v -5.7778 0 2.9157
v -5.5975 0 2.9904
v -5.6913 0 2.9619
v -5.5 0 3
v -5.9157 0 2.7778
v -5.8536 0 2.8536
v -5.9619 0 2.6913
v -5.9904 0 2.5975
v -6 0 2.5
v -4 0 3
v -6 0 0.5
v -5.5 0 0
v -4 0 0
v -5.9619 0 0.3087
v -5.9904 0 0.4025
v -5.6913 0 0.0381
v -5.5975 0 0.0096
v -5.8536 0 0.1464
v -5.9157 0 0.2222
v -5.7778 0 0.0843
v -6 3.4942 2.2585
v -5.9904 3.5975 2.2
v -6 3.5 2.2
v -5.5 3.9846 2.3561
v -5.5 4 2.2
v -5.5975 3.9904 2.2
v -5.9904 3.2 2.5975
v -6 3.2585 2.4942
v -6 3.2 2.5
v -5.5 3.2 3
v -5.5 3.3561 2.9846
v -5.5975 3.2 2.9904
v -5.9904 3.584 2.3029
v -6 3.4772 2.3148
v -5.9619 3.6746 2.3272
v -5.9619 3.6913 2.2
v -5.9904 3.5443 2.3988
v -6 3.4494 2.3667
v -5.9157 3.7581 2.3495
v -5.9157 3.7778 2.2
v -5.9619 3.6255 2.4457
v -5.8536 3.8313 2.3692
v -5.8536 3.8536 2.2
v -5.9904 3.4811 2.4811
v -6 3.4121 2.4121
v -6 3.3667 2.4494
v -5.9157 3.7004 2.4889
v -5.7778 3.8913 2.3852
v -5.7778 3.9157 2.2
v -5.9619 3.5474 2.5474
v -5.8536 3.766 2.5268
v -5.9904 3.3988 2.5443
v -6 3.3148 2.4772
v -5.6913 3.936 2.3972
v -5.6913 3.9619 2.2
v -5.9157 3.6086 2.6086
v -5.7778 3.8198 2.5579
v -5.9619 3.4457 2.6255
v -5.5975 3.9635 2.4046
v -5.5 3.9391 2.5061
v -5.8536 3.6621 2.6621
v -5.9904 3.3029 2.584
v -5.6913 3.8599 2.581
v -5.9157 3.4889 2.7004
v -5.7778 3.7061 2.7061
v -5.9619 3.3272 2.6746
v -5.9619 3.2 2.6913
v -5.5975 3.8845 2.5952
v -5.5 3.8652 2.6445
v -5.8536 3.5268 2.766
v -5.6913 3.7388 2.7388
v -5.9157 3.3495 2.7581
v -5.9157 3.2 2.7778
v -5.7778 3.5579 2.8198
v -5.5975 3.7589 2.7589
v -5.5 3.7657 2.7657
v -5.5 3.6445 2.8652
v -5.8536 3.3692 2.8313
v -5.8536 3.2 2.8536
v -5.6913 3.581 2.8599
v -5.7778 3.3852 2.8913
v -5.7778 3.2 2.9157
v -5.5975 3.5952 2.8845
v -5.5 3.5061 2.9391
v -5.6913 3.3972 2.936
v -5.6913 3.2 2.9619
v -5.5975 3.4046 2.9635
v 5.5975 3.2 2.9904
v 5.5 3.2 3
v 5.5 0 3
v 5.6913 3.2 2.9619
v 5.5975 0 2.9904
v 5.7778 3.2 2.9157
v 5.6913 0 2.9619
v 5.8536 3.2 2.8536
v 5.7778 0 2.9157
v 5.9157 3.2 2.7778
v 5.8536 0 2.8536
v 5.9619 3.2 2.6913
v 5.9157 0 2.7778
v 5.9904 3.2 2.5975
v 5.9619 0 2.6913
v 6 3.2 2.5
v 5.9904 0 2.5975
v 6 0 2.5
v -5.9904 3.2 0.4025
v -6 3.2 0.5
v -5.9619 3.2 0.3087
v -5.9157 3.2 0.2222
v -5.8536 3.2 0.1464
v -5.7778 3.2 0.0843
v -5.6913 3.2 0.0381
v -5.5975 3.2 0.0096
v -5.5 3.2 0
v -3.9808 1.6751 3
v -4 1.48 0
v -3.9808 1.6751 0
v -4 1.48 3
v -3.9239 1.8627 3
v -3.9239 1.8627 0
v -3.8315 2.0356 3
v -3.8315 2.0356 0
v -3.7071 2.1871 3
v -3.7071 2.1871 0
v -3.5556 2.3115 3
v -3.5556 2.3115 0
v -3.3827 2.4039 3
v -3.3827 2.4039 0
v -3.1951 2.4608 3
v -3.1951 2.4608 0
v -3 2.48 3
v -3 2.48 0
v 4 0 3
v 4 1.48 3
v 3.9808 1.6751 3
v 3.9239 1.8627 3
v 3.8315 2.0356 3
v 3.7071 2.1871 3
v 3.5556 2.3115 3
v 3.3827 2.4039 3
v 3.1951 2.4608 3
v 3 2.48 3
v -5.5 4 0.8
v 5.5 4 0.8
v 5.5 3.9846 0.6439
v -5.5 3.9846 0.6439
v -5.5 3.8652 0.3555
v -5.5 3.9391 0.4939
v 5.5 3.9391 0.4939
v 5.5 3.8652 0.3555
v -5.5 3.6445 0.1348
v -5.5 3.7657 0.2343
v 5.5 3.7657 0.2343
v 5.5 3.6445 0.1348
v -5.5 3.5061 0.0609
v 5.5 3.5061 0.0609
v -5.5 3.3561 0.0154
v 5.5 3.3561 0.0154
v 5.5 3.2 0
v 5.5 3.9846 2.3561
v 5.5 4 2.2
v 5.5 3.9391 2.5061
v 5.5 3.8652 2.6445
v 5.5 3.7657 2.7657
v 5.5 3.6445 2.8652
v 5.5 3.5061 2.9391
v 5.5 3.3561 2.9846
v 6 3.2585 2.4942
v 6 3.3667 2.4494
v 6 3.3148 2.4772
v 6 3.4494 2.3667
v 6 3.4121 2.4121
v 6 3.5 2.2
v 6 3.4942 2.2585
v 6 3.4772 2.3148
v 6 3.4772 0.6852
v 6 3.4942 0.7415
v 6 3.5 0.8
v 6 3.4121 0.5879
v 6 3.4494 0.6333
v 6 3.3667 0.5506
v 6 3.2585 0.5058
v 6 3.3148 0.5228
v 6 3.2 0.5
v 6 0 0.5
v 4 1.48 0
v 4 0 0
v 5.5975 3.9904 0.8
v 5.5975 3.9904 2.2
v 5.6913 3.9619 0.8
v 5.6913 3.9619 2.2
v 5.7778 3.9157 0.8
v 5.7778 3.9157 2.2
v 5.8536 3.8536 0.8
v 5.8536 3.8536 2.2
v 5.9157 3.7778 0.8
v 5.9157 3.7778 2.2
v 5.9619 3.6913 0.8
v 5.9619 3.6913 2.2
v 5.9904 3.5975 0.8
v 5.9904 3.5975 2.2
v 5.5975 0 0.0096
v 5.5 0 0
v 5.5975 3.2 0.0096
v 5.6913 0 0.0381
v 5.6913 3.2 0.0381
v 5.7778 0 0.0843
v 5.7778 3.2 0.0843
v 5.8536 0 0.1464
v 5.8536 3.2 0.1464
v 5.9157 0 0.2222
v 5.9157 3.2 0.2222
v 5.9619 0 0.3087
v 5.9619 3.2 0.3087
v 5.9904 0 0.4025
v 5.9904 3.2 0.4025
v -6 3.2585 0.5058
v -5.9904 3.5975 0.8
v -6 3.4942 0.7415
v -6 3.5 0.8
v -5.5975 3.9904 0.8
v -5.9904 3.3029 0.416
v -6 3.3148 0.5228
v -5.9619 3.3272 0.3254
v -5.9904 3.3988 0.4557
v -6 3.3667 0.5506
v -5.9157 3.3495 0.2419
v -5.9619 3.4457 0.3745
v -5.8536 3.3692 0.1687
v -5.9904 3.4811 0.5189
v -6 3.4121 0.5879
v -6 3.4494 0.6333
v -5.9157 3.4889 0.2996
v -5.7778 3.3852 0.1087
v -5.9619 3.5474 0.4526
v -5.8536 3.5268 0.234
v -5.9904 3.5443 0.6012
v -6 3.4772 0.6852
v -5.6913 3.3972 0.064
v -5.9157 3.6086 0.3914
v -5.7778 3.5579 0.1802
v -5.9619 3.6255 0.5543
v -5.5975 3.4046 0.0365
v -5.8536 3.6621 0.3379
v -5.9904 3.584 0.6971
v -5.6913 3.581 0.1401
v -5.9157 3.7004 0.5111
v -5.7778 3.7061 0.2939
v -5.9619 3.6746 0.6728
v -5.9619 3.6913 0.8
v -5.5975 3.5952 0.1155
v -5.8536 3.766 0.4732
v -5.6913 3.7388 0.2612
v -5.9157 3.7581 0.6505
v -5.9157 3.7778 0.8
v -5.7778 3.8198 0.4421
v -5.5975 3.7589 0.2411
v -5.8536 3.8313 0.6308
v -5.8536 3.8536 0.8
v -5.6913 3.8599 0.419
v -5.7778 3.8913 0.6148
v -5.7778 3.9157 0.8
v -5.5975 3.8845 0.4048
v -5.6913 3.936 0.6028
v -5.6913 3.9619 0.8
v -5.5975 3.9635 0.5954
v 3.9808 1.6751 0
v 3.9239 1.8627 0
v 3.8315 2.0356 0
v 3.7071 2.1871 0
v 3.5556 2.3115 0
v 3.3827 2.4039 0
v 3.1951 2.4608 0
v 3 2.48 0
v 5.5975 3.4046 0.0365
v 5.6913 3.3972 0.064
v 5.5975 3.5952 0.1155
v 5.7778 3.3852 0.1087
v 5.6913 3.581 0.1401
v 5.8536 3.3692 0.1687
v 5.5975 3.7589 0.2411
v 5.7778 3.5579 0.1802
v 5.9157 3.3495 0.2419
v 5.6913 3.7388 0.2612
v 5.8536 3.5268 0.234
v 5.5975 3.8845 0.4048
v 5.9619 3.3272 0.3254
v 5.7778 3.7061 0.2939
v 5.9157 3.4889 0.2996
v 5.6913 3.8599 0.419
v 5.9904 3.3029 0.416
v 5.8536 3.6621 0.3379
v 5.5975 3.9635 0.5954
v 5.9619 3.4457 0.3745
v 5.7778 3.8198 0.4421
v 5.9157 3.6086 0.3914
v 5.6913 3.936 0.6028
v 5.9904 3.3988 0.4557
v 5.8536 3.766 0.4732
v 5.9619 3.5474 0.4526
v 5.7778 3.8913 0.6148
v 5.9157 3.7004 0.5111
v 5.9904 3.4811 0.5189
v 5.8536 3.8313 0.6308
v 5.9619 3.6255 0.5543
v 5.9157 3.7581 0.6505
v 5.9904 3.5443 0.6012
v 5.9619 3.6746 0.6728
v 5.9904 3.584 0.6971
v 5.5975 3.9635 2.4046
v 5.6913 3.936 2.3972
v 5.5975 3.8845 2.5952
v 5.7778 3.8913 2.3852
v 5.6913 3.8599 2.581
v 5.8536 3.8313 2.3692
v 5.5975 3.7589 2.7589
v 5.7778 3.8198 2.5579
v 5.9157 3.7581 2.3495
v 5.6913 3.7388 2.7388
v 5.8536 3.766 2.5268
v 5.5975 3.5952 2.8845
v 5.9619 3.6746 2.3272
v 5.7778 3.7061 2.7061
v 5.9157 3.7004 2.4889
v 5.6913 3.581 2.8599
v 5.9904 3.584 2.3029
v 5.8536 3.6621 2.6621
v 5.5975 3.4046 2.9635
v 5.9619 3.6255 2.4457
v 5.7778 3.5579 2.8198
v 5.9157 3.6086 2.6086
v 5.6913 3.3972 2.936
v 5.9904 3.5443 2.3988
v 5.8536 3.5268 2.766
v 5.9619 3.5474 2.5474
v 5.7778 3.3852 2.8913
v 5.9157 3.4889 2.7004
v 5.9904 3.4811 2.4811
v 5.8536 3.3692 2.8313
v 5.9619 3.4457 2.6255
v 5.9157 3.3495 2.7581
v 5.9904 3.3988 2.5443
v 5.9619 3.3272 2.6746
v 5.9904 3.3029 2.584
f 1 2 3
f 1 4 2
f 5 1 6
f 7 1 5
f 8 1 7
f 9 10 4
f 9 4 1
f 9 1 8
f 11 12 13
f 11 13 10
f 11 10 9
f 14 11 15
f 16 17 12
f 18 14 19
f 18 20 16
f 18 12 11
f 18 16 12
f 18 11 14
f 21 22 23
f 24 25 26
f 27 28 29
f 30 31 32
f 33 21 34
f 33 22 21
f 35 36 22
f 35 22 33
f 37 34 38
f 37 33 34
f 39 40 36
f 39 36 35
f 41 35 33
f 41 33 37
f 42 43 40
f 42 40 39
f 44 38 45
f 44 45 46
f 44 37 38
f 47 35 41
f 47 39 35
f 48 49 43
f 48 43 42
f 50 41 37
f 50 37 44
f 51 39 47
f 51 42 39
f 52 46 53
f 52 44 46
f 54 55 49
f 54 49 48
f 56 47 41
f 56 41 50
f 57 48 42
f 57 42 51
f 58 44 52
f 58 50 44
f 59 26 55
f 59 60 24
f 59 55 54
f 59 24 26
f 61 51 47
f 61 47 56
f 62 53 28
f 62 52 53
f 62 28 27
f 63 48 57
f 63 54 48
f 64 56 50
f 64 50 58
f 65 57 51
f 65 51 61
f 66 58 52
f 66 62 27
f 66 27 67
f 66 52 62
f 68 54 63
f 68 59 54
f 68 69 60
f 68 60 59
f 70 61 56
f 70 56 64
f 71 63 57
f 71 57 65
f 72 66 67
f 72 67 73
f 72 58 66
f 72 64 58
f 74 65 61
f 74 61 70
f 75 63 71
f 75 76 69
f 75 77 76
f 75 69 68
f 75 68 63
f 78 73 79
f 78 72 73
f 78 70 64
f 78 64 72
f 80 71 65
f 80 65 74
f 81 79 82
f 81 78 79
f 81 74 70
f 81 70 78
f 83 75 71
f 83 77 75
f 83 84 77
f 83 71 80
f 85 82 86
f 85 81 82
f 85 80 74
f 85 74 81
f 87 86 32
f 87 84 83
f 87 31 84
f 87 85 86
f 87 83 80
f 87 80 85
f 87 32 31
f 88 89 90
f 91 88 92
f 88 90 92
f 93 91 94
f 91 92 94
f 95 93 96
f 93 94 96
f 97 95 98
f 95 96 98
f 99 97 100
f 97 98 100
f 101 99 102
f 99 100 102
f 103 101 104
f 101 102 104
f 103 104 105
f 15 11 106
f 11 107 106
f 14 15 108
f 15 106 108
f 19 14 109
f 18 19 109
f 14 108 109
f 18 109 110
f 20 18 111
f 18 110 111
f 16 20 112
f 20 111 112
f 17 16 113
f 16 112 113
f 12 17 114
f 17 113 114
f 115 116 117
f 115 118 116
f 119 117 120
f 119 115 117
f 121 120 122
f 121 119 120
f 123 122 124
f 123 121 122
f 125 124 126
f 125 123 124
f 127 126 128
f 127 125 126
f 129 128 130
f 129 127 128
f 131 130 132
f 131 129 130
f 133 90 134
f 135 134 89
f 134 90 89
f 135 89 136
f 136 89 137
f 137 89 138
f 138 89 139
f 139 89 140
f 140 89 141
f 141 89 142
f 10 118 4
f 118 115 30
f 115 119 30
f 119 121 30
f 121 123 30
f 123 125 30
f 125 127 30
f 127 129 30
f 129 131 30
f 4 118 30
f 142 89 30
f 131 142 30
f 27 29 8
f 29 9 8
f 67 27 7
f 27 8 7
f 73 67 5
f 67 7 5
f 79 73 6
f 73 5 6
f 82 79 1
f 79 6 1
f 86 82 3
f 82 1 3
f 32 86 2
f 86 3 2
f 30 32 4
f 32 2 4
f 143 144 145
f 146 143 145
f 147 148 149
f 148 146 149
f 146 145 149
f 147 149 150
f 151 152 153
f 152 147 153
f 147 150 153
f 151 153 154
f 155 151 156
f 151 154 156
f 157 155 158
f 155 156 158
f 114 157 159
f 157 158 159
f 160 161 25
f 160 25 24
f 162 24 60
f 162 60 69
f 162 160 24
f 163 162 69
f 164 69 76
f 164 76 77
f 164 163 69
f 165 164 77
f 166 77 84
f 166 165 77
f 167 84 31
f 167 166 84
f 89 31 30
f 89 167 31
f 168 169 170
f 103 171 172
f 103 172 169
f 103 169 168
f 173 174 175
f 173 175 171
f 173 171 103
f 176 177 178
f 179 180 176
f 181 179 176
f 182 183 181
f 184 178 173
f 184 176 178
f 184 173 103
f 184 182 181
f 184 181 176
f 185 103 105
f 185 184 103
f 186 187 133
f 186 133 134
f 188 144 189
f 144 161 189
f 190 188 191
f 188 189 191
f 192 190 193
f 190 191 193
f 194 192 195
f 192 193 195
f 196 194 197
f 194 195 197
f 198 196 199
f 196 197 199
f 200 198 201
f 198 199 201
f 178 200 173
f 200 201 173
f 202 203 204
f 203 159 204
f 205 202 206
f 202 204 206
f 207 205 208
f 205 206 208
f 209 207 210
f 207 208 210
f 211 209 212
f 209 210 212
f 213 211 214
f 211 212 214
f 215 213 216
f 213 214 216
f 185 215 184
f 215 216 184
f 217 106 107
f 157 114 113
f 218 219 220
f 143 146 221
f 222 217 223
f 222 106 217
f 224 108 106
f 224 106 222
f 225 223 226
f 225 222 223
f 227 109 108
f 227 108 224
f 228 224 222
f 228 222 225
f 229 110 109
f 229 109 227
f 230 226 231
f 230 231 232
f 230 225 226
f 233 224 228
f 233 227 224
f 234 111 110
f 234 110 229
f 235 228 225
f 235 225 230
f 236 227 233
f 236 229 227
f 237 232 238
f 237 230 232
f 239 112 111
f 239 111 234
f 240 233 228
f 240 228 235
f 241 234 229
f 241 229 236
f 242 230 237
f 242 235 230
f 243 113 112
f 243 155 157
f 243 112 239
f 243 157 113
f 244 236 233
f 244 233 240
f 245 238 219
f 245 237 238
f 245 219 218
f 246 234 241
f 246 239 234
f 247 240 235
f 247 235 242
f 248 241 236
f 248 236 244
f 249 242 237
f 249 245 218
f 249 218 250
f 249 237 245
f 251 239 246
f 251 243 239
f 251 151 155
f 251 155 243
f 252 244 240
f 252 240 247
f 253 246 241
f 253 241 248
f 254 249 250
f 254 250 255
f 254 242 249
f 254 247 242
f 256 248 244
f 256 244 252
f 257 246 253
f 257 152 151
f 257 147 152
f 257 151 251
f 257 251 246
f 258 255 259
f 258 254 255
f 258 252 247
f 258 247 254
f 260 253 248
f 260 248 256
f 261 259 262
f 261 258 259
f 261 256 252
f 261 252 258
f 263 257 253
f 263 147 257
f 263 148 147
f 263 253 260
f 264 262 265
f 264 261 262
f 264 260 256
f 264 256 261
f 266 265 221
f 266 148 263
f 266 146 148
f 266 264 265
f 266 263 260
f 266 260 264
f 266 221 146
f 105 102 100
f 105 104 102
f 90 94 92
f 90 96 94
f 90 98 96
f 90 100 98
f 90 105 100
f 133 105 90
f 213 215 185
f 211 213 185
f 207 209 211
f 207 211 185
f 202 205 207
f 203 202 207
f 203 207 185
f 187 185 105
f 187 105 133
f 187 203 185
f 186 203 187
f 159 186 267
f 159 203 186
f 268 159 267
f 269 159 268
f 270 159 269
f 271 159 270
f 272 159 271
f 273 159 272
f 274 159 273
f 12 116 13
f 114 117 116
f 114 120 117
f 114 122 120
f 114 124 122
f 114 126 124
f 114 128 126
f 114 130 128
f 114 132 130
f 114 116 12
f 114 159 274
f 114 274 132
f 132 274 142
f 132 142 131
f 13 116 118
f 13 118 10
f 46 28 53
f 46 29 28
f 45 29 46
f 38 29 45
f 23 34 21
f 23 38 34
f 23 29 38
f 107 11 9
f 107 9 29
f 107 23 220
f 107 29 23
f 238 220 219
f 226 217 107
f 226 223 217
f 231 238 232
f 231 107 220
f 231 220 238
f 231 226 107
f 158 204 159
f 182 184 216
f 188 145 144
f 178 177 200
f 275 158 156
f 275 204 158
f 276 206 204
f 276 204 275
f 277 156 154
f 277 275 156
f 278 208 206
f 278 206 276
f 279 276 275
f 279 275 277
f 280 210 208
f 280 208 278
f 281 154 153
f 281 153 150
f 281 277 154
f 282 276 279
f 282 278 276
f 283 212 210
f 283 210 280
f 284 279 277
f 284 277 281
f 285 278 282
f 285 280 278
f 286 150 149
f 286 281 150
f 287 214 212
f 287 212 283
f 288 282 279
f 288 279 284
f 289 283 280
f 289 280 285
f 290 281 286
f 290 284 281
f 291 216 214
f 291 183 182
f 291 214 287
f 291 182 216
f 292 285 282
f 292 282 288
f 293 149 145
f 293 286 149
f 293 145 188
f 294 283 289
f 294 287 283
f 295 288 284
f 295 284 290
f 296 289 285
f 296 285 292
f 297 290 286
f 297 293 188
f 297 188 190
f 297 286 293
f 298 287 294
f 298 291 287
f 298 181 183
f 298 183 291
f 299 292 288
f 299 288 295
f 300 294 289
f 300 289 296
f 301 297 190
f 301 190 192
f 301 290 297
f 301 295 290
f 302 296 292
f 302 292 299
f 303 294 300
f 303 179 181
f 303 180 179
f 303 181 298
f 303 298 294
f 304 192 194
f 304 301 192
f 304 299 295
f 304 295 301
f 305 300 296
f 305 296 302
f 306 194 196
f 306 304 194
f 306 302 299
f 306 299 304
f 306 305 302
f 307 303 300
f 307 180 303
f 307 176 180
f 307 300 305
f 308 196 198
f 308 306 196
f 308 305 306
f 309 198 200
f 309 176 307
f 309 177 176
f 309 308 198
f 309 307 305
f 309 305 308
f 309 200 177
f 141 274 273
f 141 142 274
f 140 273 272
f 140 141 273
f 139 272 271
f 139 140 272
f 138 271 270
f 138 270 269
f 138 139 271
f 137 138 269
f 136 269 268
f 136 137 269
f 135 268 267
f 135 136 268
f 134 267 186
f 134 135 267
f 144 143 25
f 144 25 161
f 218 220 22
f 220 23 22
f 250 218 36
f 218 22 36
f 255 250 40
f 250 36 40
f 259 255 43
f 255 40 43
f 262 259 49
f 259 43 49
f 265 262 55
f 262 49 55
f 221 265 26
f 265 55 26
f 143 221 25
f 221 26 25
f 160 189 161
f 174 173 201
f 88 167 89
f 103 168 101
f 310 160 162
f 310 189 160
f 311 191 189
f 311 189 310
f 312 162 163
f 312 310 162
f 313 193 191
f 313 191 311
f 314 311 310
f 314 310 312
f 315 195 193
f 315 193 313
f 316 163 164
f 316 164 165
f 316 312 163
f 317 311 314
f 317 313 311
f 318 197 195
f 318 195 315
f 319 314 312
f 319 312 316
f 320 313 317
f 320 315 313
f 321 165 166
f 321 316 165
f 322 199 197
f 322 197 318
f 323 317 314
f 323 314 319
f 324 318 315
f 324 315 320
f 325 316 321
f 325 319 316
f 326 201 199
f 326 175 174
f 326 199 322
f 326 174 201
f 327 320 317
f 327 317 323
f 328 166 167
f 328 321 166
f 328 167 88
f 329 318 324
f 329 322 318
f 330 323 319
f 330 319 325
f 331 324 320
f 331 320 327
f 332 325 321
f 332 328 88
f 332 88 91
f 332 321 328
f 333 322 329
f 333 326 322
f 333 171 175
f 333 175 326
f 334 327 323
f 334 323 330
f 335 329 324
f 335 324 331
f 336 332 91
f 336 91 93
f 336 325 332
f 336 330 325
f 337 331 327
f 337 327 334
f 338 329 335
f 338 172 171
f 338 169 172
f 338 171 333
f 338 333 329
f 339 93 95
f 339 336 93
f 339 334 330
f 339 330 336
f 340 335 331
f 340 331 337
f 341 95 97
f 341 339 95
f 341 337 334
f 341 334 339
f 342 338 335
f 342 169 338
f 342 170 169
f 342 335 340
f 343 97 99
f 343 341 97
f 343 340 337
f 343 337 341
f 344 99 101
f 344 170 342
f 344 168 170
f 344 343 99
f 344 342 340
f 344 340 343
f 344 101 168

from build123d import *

# Parameters (mm, degrees)
PAD_DEPTH   = 3
FILLET_R    = 0.8
FILLET001_R = 0.8
FILLET002_R = 0.5
FILLET003_R = 0.5
FILLET004_R = 1
FILLET005_R = 1


with BuildPart() as part:
    # Sketch → Pad (new body)
    with BuildSketch(Plane.XY):
        Polygon((-4, 0), (-6, 0), (-6, 4), (6, 4), (6, 0), (4, 0), (4, 2.48), (-4, 2.48), align=None)
    extrude(amount=PAD_DEPTH)

    # Fillet
    fillet_edges = [part.edges().sort_by_distance(p)[0] for p in [
        (0, 4, 3),
    ]]
    fillet(fillet_edges, radius=FILLET_R)

    # Fillet001
    fillet001_edges = [part.edges().sort_by_distance(p)[0] for p in [
        (0, 4, 0),
    ]]
    fillet(fillet001_edges, radius=FILLET001_R)

    # Fillet002
    fillet002_edges = [part.edges().sort_by_distance(p)[0] for p in [
        (6, 1.6, 3),
    ]]
    fillet(fillet002_edges, radius=FILLET002_R)

    # Fillet003
    fillet003_edges = [part.edges().sort_by_distance(p)[0] for p in [
        (-6, 1.6, 0),
    ]]
    fillet(fillet003_edges, radius=FILLET003_R)

    # Fillet004
    fillet004_edges = [part.edges().sort_by_distance(p)[0] for p in [
        (-4, 2.48, 1.5),
    ]]
    fillet(fillet004_edges, radius=FILLET004_R)

    # Fillet005
    fillet005_edges = [part.edges().sort_by_distance(p)[0] for p in [
        (4, 2.48, 1.5),
    ]]
    fillet(fillet005_edges, radius=FILLET005_R)


solid = part.part
